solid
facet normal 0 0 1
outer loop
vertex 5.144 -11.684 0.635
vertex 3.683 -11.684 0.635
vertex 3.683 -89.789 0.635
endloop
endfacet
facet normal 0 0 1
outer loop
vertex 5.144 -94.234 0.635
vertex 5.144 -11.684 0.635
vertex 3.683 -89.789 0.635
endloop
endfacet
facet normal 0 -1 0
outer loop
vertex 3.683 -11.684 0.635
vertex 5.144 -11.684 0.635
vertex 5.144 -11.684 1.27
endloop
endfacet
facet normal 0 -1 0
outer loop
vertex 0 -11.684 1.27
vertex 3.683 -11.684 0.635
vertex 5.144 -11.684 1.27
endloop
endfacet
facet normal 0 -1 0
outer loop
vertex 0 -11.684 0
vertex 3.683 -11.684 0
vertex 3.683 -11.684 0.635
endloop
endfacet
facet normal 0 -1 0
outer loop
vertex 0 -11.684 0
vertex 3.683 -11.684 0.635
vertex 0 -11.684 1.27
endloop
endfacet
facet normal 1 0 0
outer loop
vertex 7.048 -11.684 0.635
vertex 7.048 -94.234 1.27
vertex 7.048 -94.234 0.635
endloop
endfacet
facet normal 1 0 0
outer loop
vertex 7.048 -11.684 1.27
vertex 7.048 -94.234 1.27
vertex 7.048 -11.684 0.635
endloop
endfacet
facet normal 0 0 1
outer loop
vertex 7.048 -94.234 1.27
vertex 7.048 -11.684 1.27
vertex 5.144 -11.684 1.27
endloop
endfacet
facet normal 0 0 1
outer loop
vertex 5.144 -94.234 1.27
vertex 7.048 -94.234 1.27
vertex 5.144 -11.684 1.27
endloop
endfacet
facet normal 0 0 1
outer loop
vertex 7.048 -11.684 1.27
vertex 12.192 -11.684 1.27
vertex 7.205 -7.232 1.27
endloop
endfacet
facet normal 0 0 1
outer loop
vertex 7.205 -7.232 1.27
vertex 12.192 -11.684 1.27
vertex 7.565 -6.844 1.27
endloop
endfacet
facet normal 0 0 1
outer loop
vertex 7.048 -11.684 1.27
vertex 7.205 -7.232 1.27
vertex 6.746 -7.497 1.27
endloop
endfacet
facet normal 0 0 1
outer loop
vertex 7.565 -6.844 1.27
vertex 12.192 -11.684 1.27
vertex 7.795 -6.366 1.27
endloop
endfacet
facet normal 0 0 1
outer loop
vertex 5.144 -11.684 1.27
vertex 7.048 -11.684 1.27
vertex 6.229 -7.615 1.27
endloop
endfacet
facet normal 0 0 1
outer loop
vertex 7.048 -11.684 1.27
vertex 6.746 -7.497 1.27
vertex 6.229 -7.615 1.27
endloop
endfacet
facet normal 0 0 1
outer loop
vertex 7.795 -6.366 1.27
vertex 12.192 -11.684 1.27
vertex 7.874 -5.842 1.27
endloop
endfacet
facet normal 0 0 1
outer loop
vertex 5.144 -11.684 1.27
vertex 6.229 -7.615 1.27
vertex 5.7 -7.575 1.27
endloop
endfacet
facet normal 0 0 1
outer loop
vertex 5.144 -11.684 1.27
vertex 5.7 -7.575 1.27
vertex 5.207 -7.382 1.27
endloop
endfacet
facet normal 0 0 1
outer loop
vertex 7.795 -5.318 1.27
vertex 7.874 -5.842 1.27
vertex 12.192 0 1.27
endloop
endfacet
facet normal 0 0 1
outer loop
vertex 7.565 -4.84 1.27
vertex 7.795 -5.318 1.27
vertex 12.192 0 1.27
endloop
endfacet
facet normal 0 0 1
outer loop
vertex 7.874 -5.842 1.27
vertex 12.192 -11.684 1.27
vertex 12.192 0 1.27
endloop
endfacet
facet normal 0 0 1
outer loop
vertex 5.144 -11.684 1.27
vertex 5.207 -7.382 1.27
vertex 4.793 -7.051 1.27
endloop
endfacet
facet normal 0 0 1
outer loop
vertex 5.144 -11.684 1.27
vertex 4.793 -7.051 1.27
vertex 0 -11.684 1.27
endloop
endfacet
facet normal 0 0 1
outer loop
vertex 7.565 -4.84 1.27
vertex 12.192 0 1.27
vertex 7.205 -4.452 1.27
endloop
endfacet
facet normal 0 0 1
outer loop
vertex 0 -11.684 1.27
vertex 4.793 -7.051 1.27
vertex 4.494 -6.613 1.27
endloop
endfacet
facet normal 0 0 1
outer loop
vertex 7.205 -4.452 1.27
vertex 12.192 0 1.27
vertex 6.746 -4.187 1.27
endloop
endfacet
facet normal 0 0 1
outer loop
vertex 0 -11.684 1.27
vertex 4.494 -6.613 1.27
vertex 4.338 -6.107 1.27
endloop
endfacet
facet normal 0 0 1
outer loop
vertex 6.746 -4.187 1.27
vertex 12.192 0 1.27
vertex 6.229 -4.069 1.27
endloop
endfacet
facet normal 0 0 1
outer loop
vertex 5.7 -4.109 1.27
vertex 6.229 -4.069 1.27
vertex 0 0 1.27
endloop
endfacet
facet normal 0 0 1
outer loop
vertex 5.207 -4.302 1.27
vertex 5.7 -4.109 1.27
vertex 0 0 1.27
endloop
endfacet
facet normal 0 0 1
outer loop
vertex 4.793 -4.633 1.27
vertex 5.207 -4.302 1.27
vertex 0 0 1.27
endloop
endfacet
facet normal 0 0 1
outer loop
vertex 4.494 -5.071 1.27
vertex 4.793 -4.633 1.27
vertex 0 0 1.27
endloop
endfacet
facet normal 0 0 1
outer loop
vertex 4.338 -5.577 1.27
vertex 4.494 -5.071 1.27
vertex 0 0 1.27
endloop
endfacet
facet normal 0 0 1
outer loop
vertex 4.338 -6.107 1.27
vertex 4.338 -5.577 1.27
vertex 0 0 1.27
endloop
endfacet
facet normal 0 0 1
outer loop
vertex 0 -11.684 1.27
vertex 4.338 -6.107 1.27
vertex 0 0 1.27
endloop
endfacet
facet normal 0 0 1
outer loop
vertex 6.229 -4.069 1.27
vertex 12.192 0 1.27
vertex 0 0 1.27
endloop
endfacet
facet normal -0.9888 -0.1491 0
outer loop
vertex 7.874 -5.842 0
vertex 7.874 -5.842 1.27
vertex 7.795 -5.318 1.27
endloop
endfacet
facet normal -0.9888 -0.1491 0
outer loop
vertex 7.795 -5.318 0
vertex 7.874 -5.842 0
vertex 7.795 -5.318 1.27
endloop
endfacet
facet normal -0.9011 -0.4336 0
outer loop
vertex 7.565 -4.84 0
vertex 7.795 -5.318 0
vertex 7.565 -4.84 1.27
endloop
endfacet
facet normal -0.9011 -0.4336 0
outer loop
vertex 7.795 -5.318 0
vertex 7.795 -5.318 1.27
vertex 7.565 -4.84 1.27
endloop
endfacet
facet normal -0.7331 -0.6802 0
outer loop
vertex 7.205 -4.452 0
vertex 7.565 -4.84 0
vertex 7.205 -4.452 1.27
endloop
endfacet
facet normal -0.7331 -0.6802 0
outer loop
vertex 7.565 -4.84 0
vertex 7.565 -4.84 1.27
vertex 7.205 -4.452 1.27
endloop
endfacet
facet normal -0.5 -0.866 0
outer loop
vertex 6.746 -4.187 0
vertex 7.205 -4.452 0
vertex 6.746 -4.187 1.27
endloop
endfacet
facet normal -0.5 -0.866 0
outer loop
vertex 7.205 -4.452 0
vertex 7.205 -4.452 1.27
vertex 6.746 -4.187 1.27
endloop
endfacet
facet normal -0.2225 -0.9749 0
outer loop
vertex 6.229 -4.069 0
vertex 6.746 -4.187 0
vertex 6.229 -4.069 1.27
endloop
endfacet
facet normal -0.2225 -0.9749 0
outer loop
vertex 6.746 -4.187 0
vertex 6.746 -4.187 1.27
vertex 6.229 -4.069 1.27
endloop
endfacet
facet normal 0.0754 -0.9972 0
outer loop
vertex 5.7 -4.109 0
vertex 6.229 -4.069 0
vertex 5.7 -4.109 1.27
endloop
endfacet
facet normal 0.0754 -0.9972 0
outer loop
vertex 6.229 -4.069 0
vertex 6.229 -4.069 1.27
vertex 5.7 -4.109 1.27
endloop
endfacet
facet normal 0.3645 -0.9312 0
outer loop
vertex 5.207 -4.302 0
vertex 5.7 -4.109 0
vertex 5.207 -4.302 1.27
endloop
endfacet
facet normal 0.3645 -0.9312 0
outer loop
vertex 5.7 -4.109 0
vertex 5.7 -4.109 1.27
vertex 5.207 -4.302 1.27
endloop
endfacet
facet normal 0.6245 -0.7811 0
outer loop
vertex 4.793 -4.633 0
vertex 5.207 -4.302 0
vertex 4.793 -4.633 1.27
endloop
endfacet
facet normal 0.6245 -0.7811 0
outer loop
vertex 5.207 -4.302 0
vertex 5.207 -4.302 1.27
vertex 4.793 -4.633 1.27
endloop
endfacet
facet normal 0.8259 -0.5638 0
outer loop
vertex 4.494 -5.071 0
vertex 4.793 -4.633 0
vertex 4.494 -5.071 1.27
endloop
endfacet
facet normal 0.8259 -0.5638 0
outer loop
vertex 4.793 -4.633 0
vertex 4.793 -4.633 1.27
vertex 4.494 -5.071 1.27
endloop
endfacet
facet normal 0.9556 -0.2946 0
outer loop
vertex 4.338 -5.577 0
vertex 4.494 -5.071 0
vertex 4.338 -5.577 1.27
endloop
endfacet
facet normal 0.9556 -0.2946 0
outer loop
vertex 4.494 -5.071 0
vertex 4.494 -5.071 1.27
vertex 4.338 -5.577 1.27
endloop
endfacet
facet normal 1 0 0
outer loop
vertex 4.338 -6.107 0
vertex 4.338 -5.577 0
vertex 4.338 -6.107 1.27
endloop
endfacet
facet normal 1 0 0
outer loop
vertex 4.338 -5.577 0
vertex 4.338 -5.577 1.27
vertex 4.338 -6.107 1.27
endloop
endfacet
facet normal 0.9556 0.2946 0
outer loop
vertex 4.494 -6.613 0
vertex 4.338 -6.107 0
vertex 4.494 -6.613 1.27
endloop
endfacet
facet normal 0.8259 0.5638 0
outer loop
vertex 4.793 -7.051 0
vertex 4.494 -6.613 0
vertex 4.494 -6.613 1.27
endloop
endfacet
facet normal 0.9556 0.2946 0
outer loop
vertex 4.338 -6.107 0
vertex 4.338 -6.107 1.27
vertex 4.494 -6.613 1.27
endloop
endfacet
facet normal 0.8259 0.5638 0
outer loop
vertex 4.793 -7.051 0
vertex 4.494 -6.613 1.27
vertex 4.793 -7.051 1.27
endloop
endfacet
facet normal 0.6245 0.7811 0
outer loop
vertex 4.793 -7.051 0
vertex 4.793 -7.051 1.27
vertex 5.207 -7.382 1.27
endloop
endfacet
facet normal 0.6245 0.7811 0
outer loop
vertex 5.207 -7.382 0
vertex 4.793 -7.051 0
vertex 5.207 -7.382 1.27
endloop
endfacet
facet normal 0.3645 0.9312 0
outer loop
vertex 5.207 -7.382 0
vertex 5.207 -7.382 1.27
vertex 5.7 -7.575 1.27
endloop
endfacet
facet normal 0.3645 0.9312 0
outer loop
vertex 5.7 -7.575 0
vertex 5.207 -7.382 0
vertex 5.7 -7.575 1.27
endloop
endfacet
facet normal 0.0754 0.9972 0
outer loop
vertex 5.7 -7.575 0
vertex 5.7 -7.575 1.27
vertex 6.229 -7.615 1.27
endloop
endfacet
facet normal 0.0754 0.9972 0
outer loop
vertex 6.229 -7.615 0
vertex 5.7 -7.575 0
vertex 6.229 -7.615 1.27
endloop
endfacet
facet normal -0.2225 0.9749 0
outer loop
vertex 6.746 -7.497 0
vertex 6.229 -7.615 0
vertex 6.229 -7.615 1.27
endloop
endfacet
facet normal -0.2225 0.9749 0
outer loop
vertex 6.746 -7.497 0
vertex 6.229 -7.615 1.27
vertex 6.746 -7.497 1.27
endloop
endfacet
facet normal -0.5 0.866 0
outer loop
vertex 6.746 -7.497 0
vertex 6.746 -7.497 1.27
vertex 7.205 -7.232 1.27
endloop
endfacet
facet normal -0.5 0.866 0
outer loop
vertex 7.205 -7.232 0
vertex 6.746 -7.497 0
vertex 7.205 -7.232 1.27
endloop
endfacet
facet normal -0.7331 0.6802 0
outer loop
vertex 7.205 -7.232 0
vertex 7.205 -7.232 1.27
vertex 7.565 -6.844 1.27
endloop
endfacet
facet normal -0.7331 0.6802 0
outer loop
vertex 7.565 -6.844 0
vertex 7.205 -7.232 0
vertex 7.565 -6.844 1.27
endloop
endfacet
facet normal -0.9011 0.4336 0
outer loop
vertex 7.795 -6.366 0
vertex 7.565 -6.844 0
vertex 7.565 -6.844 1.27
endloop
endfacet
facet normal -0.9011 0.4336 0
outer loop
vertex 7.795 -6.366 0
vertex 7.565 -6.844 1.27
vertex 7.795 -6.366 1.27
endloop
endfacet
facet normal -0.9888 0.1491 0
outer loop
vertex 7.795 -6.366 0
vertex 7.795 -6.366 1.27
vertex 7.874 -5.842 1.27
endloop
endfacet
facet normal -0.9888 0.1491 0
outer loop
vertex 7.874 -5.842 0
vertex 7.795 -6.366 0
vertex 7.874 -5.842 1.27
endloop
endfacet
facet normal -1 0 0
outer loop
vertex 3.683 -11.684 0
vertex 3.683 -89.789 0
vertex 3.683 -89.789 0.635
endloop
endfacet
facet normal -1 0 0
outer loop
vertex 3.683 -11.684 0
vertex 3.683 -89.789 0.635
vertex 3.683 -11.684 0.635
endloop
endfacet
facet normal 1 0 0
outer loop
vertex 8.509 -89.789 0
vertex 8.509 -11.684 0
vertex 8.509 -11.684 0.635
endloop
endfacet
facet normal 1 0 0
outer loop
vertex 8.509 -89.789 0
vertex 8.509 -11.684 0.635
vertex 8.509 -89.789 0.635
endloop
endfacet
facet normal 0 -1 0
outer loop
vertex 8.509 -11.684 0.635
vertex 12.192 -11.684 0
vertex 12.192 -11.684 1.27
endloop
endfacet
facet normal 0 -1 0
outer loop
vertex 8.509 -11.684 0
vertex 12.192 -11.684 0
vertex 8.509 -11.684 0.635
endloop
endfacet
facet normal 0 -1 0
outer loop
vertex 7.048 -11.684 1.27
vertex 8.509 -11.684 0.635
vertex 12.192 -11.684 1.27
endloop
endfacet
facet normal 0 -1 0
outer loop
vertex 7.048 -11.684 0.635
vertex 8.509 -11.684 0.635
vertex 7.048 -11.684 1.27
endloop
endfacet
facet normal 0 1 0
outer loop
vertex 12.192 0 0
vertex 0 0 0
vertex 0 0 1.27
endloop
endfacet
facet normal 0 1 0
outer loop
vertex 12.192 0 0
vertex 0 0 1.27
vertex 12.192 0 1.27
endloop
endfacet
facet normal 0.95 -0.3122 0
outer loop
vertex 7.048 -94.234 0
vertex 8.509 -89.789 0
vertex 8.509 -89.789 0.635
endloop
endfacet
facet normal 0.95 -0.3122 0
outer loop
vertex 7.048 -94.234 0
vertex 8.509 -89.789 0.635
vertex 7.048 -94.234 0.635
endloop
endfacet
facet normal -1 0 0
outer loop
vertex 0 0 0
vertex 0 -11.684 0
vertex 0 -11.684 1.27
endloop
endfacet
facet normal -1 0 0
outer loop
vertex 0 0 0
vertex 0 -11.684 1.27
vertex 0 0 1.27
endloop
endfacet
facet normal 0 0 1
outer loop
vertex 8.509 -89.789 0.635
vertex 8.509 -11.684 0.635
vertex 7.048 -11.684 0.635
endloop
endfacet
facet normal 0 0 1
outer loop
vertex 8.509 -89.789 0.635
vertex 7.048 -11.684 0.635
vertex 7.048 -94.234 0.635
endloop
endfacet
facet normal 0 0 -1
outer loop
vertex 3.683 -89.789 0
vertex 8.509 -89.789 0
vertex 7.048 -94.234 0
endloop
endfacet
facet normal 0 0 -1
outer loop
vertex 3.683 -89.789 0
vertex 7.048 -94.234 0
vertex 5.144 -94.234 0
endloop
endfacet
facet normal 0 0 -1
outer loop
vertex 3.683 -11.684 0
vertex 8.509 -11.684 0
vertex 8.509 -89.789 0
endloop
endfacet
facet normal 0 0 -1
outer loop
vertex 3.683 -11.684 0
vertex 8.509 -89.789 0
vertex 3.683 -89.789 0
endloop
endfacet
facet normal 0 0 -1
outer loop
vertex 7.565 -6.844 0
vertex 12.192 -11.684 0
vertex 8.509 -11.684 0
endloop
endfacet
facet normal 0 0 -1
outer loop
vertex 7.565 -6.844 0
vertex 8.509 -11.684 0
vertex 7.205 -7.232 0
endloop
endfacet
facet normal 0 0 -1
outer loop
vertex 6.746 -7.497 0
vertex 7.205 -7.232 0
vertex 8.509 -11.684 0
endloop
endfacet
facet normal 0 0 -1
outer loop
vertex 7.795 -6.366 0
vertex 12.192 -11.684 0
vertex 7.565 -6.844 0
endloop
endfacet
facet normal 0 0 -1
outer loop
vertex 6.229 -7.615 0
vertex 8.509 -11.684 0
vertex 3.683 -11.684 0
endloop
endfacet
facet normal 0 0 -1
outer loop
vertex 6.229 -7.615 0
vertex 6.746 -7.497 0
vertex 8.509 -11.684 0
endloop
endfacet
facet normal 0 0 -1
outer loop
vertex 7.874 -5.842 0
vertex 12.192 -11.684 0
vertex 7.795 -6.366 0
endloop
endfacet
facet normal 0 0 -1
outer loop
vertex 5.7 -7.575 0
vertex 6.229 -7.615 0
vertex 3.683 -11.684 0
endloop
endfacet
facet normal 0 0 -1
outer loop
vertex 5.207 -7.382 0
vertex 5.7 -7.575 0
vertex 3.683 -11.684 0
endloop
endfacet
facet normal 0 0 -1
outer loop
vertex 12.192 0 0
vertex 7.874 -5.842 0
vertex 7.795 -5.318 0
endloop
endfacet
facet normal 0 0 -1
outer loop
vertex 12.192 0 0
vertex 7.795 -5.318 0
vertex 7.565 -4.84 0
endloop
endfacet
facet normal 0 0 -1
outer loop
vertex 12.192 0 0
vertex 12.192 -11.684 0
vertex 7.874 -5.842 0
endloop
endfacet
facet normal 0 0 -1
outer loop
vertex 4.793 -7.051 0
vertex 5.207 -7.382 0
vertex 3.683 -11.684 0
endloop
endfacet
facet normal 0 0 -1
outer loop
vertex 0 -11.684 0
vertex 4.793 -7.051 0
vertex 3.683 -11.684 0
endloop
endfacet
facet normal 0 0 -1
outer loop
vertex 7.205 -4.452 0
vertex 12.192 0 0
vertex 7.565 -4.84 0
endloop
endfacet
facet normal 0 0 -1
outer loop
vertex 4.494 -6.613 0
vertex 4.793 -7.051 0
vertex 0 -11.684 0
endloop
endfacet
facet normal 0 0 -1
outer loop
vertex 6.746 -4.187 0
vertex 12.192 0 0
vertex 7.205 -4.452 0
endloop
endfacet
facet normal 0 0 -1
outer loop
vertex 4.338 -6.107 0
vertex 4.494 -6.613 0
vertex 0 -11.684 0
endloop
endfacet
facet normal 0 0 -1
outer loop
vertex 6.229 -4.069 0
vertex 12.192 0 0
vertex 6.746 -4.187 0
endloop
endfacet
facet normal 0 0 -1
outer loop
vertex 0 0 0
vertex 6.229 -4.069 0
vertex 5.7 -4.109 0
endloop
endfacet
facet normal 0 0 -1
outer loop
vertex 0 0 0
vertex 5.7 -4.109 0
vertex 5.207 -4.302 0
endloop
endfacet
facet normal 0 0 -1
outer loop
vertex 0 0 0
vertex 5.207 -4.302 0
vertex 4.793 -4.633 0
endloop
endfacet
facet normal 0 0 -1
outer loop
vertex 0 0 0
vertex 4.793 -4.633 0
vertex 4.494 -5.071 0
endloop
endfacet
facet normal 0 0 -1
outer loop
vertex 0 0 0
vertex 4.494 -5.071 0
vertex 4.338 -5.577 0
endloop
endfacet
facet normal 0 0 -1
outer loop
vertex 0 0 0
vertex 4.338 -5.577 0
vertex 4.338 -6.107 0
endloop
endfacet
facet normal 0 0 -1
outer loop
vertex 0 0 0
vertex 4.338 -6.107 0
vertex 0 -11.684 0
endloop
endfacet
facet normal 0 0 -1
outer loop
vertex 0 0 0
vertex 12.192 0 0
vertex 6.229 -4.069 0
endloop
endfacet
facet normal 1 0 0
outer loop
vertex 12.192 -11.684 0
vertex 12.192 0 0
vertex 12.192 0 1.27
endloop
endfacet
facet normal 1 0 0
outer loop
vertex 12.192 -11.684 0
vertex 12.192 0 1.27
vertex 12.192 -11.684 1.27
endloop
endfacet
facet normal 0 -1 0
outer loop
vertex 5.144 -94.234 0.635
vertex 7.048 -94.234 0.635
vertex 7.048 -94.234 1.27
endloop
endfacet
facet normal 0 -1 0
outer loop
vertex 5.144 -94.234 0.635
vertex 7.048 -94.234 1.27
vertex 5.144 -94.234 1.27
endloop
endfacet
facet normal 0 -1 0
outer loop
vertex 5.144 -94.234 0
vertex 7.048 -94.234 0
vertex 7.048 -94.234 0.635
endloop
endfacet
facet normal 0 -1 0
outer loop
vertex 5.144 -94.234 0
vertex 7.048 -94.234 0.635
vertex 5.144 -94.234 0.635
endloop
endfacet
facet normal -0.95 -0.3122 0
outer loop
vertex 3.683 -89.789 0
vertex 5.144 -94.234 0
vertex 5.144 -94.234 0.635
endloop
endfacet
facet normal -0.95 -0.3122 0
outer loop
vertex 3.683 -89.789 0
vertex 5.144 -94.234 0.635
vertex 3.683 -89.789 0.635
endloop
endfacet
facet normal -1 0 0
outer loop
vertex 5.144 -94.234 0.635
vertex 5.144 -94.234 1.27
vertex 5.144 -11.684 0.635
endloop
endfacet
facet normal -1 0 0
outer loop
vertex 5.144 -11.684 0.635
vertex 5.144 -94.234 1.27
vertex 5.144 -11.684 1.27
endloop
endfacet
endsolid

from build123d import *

# Parameters (mm, degrees)
BOSS_EXTRUDE1_DEPTH = 1.27
CUT_EXTRUDE1_DEPTH  = 0.635
SKETCH3_R           = 1.778
CUT_EXTRUDE2_DEPTH  = 96.027914425


with BuildPart() as part:
    # Sketch1 → Boss-Extrude1 (new body)
    with BuildSketch(Plane.XY):
        Polygon((0, 0), (12.192, 0), (12.192, -11.684), (8.509, -11.684), (8.509, -89.789), (7.0485, -94.234), (5.1435, -94.234), (3.683, -89.789), (3.683, -11.684), (0, -11.684), align=None)
    extrude(amount=BOSS_EXTRUDE1_DEPTH)

    # Sketch2 → Cut-Extrude1 (cut)
    with BuildSketch(Plane.XY.offset(1.27)):
        Polygon((5.1435, -94.234), (5.1435, -11.684), (3.683, -11.684), (3.683, -89.789), align=None)
        Polygon((8.509, -11.684), (8.509, -89.789), (7.0485, -94.234), (7.0485, -11.684), align=None)
    extrude(amount=-CUT_EXTRUDE1_DEPTH, mode=Mode.SUBTRACT)

    # Sketch3 → Cut-Extrude2 (cut, through all)
    with BuildSketch(Plane.XY.offset(1.27)):
        with Locations((6.096, -5.842)):
            Circle(SKETCH3_R)
    extrude(amount=-CUT_EXTRUDE2_DEPTH, mode=Mode.SUBTRACT)


solid = part.part
